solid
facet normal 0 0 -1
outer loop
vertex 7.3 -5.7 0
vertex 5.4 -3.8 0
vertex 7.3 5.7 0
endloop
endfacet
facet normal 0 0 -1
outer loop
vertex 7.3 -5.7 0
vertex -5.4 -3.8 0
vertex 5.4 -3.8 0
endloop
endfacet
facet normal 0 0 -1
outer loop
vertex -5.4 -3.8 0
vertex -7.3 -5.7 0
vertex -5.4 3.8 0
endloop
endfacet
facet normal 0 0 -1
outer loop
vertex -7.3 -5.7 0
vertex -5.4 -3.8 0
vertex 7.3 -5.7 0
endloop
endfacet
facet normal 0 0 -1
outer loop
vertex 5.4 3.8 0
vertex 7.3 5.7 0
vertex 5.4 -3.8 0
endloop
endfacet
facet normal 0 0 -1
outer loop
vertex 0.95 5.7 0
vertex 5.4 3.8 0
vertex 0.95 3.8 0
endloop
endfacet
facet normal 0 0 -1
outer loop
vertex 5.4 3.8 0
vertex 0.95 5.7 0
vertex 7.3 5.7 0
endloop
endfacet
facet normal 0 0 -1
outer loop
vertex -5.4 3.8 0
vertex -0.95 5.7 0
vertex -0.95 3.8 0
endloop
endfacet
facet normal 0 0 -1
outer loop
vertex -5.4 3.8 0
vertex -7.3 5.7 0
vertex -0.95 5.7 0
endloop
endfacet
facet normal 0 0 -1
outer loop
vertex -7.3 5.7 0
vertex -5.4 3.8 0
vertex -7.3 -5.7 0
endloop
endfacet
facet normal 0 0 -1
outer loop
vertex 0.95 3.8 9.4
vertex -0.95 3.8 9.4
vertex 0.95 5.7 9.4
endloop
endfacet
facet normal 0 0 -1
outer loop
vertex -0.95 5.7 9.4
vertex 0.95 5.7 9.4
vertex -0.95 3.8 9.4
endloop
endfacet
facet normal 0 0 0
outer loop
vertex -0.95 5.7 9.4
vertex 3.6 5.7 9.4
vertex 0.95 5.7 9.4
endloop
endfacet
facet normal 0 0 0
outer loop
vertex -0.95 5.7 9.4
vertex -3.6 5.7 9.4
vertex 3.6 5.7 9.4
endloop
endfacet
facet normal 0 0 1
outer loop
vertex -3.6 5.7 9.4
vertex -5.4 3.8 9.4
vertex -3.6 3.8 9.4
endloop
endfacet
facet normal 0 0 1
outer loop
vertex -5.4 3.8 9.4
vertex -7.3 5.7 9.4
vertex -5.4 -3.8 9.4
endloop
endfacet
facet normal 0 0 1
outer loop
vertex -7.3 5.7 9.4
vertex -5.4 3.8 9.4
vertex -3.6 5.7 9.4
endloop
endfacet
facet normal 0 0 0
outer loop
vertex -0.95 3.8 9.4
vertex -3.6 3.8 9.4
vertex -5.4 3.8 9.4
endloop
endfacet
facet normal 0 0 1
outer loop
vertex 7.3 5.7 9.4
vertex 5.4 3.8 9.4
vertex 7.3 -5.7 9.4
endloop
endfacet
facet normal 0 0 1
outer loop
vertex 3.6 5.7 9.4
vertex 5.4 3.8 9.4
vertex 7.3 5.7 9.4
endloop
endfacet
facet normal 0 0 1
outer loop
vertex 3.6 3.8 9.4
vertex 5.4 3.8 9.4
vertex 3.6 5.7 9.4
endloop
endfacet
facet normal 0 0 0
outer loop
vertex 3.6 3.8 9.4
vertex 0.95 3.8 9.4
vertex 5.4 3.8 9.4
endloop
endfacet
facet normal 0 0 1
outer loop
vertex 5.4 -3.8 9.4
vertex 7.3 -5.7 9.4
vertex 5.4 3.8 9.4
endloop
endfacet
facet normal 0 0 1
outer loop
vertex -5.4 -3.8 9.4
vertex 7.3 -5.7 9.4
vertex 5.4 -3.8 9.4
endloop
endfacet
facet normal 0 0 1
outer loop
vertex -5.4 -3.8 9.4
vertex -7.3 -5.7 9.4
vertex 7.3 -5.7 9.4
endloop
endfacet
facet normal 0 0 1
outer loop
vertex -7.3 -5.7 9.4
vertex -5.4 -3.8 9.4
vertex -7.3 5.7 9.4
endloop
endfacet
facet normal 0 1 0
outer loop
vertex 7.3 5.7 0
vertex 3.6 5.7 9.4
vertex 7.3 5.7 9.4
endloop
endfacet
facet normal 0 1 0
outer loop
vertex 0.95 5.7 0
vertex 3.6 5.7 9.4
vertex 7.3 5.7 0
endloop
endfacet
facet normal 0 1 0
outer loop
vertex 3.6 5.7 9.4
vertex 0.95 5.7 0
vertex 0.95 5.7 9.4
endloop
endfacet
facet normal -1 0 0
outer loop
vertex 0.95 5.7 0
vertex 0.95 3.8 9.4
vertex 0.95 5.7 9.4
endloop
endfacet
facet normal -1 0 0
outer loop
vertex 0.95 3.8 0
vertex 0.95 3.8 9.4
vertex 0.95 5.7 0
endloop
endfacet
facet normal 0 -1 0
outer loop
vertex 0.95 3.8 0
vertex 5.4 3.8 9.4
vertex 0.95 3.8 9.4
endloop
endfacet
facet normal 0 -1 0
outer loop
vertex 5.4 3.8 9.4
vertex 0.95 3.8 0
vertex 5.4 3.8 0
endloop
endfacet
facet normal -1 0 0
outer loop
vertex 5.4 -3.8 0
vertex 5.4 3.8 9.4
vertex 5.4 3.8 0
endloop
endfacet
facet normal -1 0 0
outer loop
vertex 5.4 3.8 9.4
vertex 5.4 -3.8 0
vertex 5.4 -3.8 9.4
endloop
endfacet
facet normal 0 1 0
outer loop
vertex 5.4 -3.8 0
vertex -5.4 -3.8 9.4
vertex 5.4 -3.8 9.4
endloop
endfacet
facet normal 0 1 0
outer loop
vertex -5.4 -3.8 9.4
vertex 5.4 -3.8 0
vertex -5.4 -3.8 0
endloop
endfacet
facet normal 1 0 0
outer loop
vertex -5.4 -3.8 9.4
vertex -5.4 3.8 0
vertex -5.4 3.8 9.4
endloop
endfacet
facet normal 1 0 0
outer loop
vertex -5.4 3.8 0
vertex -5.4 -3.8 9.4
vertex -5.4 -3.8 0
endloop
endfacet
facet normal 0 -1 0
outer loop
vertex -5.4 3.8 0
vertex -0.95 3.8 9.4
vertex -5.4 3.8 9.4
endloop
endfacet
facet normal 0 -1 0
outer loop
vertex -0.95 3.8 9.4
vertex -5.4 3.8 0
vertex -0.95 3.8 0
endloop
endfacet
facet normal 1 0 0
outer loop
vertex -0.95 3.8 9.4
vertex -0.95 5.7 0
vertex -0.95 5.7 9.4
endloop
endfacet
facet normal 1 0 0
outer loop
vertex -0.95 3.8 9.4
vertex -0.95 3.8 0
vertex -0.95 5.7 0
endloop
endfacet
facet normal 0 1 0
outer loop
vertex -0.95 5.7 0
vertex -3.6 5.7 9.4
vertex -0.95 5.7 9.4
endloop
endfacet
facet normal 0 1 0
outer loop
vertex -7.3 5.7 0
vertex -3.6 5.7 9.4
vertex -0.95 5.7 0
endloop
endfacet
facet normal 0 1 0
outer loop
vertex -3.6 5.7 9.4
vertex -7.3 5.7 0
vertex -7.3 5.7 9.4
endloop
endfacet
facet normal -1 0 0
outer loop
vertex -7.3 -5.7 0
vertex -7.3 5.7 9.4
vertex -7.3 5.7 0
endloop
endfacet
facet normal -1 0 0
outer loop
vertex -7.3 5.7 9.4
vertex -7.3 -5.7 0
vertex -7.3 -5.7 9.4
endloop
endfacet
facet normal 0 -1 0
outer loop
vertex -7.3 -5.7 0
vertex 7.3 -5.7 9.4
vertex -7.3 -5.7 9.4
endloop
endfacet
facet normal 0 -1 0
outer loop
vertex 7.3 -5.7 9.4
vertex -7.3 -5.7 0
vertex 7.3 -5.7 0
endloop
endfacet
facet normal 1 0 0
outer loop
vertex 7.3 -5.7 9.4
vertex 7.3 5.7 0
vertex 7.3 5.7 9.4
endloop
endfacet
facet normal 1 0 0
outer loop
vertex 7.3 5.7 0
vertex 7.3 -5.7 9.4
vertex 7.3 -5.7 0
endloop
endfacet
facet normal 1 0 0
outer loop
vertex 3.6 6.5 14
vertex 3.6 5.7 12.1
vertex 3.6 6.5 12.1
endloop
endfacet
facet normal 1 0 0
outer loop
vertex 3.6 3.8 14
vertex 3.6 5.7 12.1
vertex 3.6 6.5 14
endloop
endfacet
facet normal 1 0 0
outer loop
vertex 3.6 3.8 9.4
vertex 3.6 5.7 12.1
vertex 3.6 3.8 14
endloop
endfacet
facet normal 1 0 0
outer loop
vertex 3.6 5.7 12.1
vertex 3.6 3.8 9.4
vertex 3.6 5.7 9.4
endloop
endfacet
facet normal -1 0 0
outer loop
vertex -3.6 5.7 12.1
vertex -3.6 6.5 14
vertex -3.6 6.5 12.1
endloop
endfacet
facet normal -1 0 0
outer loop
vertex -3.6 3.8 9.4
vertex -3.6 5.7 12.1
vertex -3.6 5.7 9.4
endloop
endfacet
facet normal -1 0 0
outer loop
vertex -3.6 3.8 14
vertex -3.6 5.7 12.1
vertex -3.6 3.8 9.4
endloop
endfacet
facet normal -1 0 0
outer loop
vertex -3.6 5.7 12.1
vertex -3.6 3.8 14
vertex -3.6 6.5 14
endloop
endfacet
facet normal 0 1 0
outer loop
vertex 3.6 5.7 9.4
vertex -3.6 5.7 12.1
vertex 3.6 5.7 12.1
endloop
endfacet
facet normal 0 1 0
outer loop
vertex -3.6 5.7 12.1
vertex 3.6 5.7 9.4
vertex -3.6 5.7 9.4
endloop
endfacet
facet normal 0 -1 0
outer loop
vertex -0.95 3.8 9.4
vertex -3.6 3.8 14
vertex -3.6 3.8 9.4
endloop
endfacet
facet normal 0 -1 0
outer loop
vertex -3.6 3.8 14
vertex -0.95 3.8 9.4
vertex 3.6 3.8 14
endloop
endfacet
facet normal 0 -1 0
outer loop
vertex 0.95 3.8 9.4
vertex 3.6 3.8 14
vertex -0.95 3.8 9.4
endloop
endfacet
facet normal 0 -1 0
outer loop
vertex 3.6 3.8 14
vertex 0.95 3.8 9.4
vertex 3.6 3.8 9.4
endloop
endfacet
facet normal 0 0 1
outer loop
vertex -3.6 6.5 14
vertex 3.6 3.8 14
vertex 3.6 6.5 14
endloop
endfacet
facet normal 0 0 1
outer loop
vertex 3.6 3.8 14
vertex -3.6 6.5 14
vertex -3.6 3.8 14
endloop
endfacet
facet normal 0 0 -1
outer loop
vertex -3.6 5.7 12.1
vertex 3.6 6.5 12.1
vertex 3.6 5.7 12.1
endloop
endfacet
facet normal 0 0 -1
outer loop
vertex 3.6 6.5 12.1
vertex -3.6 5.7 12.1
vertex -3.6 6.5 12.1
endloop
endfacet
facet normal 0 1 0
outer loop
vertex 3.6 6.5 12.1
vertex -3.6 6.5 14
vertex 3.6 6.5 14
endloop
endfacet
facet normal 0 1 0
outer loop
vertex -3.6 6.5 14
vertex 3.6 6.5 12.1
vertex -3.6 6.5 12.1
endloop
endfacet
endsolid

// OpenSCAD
inner_length = 10.8;
inner_width=7.6;
wall=1.9;
height=9.4;
upper_length=7.2;
upper_height=2.9;
upper_width=2.7;

union() {
linear_extrude(height) {
difference() {
square([inner_length+2*wall, inner_width+2*wall],true);
square([inner_length, inner_width],true);
translate([-wall/2,0,0])square([wall,inner_width+2*wall],false);
}
}
translate([-upper_length/2, inner_width/2, height])cube([upper_length,wall,upper_height],false);
translate([-upper_length/2, inner_width/2, height+upper_width])cube([upper_length,upper_width,wall],false);
}
